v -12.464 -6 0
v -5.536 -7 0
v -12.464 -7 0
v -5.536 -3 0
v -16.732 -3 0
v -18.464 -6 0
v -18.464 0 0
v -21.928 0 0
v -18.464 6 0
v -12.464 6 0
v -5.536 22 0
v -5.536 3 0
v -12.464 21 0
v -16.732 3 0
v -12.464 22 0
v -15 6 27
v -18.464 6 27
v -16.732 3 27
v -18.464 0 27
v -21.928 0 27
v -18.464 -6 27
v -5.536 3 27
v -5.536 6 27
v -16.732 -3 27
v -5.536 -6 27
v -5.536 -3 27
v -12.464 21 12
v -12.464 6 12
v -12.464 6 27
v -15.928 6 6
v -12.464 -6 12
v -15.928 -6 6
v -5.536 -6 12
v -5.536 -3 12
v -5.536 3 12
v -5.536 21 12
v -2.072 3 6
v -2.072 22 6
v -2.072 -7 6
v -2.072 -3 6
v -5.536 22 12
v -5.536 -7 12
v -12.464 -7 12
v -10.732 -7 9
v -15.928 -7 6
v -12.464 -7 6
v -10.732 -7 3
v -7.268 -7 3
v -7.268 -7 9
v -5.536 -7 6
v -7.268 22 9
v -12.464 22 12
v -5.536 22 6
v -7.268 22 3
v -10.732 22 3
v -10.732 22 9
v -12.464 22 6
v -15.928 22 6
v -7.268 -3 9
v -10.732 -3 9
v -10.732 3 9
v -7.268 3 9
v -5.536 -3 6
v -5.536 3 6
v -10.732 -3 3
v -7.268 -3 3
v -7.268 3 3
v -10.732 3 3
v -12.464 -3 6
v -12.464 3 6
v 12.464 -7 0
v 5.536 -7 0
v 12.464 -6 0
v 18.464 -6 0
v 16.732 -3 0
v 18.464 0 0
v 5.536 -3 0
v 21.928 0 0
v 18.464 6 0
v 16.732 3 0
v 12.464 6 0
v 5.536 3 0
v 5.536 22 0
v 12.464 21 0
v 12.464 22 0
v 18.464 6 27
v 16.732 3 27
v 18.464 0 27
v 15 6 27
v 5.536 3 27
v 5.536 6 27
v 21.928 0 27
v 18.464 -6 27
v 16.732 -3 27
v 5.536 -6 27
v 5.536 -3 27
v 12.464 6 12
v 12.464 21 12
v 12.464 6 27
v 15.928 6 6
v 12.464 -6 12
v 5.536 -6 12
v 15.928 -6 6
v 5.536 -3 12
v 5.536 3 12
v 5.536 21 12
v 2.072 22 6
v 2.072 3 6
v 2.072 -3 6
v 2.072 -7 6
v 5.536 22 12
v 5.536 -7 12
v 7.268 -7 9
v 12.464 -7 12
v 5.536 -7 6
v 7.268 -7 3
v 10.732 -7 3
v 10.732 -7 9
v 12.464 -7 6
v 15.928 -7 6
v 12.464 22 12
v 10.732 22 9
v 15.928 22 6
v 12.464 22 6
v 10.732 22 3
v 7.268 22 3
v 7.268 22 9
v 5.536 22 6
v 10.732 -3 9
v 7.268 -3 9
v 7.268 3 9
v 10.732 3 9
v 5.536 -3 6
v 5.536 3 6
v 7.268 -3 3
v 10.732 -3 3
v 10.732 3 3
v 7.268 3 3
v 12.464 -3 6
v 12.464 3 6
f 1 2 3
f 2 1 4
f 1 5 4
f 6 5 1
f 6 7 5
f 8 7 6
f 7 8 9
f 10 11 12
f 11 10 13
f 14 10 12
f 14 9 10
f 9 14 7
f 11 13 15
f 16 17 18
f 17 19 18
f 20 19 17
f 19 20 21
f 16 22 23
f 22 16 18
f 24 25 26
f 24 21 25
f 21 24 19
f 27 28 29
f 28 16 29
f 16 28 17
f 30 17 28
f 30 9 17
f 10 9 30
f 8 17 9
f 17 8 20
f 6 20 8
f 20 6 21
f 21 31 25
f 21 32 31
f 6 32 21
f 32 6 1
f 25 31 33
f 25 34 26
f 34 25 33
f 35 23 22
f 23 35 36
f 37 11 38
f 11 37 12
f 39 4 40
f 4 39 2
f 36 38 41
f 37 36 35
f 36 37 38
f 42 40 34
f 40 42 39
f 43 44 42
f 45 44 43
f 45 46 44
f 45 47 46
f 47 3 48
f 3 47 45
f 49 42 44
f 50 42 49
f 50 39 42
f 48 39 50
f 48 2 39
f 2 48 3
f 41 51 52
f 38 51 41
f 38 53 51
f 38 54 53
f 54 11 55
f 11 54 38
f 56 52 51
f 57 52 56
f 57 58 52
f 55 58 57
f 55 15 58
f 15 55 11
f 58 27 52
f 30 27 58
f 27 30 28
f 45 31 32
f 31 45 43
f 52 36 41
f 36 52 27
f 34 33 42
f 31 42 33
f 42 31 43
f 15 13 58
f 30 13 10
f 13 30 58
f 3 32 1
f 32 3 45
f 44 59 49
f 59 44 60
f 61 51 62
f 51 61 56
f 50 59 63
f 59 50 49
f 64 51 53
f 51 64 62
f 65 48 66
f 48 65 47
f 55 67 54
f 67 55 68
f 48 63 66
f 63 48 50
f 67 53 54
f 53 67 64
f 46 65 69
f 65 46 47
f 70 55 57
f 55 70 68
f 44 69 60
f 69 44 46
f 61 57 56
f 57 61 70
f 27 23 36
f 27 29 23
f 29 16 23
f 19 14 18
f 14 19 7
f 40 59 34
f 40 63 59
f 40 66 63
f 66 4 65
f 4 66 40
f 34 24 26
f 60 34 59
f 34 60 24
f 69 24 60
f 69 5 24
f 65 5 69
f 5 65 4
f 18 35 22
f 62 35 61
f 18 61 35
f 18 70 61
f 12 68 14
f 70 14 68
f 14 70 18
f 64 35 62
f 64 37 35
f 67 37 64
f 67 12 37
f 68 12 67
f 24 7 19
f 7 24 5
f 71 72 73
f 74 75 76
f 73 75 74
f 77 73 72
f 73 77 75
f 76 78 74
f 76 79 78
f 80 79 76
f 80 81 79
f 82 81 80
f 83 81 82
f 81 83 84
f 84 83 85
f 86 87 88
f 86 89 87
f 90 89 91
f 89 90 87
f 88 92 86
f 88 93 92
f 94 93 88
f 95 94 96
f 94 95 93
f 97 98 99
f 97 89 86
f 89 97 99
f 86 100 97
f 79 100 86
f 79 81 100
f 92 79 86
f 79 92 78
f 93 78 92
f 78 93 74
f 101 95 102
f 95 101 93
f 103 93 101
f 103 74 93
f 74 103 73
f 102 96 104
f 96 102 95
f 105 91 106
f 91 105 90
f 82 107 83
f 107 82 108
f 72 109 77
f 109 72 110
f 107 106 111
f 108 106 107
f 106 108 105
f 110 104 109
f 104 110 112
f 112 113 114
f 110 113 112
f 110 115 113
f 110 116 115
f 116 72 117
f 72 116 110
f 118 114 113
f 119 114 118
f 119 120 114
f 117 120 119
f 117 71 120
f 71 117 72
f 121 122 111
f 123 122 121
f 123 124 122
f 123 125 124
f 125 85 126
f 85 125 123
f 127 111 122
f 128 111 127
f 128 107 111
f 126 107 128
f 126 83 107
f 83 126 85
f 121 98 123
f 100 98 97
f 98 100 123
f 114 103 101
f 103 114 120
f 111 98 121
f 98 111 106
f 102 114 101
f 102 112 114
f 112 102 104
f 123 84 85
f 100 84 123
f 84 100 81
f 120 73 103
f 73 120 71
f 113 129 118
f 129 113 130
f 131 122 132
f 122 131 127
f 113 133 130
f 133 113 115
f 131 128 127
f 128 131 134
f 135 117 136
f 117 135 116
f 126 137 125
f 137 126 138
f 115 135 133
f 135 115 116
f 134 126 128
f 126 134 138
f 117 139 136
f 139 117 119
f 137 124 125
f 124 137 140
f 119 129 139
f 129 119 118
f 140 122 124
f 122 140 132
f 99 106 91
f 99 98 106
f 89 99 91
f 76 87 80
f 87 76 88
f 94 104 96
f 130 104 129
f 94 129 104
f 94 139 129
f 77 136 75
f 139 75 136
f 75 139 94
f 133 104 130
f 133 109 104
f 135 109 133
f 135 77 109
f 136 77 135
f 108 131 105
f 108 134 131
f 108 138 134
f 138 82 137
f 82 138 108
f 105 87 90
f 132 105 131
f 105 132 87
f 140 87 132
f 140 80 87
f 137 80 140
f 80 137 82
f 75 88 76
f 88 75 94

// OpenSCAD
include <wallace.scad>;

!for(side = [0, 1]) mirror([side, 0, 0]) translate([-rod_size * 2.5, 0, 0]) z_top_clamp();
